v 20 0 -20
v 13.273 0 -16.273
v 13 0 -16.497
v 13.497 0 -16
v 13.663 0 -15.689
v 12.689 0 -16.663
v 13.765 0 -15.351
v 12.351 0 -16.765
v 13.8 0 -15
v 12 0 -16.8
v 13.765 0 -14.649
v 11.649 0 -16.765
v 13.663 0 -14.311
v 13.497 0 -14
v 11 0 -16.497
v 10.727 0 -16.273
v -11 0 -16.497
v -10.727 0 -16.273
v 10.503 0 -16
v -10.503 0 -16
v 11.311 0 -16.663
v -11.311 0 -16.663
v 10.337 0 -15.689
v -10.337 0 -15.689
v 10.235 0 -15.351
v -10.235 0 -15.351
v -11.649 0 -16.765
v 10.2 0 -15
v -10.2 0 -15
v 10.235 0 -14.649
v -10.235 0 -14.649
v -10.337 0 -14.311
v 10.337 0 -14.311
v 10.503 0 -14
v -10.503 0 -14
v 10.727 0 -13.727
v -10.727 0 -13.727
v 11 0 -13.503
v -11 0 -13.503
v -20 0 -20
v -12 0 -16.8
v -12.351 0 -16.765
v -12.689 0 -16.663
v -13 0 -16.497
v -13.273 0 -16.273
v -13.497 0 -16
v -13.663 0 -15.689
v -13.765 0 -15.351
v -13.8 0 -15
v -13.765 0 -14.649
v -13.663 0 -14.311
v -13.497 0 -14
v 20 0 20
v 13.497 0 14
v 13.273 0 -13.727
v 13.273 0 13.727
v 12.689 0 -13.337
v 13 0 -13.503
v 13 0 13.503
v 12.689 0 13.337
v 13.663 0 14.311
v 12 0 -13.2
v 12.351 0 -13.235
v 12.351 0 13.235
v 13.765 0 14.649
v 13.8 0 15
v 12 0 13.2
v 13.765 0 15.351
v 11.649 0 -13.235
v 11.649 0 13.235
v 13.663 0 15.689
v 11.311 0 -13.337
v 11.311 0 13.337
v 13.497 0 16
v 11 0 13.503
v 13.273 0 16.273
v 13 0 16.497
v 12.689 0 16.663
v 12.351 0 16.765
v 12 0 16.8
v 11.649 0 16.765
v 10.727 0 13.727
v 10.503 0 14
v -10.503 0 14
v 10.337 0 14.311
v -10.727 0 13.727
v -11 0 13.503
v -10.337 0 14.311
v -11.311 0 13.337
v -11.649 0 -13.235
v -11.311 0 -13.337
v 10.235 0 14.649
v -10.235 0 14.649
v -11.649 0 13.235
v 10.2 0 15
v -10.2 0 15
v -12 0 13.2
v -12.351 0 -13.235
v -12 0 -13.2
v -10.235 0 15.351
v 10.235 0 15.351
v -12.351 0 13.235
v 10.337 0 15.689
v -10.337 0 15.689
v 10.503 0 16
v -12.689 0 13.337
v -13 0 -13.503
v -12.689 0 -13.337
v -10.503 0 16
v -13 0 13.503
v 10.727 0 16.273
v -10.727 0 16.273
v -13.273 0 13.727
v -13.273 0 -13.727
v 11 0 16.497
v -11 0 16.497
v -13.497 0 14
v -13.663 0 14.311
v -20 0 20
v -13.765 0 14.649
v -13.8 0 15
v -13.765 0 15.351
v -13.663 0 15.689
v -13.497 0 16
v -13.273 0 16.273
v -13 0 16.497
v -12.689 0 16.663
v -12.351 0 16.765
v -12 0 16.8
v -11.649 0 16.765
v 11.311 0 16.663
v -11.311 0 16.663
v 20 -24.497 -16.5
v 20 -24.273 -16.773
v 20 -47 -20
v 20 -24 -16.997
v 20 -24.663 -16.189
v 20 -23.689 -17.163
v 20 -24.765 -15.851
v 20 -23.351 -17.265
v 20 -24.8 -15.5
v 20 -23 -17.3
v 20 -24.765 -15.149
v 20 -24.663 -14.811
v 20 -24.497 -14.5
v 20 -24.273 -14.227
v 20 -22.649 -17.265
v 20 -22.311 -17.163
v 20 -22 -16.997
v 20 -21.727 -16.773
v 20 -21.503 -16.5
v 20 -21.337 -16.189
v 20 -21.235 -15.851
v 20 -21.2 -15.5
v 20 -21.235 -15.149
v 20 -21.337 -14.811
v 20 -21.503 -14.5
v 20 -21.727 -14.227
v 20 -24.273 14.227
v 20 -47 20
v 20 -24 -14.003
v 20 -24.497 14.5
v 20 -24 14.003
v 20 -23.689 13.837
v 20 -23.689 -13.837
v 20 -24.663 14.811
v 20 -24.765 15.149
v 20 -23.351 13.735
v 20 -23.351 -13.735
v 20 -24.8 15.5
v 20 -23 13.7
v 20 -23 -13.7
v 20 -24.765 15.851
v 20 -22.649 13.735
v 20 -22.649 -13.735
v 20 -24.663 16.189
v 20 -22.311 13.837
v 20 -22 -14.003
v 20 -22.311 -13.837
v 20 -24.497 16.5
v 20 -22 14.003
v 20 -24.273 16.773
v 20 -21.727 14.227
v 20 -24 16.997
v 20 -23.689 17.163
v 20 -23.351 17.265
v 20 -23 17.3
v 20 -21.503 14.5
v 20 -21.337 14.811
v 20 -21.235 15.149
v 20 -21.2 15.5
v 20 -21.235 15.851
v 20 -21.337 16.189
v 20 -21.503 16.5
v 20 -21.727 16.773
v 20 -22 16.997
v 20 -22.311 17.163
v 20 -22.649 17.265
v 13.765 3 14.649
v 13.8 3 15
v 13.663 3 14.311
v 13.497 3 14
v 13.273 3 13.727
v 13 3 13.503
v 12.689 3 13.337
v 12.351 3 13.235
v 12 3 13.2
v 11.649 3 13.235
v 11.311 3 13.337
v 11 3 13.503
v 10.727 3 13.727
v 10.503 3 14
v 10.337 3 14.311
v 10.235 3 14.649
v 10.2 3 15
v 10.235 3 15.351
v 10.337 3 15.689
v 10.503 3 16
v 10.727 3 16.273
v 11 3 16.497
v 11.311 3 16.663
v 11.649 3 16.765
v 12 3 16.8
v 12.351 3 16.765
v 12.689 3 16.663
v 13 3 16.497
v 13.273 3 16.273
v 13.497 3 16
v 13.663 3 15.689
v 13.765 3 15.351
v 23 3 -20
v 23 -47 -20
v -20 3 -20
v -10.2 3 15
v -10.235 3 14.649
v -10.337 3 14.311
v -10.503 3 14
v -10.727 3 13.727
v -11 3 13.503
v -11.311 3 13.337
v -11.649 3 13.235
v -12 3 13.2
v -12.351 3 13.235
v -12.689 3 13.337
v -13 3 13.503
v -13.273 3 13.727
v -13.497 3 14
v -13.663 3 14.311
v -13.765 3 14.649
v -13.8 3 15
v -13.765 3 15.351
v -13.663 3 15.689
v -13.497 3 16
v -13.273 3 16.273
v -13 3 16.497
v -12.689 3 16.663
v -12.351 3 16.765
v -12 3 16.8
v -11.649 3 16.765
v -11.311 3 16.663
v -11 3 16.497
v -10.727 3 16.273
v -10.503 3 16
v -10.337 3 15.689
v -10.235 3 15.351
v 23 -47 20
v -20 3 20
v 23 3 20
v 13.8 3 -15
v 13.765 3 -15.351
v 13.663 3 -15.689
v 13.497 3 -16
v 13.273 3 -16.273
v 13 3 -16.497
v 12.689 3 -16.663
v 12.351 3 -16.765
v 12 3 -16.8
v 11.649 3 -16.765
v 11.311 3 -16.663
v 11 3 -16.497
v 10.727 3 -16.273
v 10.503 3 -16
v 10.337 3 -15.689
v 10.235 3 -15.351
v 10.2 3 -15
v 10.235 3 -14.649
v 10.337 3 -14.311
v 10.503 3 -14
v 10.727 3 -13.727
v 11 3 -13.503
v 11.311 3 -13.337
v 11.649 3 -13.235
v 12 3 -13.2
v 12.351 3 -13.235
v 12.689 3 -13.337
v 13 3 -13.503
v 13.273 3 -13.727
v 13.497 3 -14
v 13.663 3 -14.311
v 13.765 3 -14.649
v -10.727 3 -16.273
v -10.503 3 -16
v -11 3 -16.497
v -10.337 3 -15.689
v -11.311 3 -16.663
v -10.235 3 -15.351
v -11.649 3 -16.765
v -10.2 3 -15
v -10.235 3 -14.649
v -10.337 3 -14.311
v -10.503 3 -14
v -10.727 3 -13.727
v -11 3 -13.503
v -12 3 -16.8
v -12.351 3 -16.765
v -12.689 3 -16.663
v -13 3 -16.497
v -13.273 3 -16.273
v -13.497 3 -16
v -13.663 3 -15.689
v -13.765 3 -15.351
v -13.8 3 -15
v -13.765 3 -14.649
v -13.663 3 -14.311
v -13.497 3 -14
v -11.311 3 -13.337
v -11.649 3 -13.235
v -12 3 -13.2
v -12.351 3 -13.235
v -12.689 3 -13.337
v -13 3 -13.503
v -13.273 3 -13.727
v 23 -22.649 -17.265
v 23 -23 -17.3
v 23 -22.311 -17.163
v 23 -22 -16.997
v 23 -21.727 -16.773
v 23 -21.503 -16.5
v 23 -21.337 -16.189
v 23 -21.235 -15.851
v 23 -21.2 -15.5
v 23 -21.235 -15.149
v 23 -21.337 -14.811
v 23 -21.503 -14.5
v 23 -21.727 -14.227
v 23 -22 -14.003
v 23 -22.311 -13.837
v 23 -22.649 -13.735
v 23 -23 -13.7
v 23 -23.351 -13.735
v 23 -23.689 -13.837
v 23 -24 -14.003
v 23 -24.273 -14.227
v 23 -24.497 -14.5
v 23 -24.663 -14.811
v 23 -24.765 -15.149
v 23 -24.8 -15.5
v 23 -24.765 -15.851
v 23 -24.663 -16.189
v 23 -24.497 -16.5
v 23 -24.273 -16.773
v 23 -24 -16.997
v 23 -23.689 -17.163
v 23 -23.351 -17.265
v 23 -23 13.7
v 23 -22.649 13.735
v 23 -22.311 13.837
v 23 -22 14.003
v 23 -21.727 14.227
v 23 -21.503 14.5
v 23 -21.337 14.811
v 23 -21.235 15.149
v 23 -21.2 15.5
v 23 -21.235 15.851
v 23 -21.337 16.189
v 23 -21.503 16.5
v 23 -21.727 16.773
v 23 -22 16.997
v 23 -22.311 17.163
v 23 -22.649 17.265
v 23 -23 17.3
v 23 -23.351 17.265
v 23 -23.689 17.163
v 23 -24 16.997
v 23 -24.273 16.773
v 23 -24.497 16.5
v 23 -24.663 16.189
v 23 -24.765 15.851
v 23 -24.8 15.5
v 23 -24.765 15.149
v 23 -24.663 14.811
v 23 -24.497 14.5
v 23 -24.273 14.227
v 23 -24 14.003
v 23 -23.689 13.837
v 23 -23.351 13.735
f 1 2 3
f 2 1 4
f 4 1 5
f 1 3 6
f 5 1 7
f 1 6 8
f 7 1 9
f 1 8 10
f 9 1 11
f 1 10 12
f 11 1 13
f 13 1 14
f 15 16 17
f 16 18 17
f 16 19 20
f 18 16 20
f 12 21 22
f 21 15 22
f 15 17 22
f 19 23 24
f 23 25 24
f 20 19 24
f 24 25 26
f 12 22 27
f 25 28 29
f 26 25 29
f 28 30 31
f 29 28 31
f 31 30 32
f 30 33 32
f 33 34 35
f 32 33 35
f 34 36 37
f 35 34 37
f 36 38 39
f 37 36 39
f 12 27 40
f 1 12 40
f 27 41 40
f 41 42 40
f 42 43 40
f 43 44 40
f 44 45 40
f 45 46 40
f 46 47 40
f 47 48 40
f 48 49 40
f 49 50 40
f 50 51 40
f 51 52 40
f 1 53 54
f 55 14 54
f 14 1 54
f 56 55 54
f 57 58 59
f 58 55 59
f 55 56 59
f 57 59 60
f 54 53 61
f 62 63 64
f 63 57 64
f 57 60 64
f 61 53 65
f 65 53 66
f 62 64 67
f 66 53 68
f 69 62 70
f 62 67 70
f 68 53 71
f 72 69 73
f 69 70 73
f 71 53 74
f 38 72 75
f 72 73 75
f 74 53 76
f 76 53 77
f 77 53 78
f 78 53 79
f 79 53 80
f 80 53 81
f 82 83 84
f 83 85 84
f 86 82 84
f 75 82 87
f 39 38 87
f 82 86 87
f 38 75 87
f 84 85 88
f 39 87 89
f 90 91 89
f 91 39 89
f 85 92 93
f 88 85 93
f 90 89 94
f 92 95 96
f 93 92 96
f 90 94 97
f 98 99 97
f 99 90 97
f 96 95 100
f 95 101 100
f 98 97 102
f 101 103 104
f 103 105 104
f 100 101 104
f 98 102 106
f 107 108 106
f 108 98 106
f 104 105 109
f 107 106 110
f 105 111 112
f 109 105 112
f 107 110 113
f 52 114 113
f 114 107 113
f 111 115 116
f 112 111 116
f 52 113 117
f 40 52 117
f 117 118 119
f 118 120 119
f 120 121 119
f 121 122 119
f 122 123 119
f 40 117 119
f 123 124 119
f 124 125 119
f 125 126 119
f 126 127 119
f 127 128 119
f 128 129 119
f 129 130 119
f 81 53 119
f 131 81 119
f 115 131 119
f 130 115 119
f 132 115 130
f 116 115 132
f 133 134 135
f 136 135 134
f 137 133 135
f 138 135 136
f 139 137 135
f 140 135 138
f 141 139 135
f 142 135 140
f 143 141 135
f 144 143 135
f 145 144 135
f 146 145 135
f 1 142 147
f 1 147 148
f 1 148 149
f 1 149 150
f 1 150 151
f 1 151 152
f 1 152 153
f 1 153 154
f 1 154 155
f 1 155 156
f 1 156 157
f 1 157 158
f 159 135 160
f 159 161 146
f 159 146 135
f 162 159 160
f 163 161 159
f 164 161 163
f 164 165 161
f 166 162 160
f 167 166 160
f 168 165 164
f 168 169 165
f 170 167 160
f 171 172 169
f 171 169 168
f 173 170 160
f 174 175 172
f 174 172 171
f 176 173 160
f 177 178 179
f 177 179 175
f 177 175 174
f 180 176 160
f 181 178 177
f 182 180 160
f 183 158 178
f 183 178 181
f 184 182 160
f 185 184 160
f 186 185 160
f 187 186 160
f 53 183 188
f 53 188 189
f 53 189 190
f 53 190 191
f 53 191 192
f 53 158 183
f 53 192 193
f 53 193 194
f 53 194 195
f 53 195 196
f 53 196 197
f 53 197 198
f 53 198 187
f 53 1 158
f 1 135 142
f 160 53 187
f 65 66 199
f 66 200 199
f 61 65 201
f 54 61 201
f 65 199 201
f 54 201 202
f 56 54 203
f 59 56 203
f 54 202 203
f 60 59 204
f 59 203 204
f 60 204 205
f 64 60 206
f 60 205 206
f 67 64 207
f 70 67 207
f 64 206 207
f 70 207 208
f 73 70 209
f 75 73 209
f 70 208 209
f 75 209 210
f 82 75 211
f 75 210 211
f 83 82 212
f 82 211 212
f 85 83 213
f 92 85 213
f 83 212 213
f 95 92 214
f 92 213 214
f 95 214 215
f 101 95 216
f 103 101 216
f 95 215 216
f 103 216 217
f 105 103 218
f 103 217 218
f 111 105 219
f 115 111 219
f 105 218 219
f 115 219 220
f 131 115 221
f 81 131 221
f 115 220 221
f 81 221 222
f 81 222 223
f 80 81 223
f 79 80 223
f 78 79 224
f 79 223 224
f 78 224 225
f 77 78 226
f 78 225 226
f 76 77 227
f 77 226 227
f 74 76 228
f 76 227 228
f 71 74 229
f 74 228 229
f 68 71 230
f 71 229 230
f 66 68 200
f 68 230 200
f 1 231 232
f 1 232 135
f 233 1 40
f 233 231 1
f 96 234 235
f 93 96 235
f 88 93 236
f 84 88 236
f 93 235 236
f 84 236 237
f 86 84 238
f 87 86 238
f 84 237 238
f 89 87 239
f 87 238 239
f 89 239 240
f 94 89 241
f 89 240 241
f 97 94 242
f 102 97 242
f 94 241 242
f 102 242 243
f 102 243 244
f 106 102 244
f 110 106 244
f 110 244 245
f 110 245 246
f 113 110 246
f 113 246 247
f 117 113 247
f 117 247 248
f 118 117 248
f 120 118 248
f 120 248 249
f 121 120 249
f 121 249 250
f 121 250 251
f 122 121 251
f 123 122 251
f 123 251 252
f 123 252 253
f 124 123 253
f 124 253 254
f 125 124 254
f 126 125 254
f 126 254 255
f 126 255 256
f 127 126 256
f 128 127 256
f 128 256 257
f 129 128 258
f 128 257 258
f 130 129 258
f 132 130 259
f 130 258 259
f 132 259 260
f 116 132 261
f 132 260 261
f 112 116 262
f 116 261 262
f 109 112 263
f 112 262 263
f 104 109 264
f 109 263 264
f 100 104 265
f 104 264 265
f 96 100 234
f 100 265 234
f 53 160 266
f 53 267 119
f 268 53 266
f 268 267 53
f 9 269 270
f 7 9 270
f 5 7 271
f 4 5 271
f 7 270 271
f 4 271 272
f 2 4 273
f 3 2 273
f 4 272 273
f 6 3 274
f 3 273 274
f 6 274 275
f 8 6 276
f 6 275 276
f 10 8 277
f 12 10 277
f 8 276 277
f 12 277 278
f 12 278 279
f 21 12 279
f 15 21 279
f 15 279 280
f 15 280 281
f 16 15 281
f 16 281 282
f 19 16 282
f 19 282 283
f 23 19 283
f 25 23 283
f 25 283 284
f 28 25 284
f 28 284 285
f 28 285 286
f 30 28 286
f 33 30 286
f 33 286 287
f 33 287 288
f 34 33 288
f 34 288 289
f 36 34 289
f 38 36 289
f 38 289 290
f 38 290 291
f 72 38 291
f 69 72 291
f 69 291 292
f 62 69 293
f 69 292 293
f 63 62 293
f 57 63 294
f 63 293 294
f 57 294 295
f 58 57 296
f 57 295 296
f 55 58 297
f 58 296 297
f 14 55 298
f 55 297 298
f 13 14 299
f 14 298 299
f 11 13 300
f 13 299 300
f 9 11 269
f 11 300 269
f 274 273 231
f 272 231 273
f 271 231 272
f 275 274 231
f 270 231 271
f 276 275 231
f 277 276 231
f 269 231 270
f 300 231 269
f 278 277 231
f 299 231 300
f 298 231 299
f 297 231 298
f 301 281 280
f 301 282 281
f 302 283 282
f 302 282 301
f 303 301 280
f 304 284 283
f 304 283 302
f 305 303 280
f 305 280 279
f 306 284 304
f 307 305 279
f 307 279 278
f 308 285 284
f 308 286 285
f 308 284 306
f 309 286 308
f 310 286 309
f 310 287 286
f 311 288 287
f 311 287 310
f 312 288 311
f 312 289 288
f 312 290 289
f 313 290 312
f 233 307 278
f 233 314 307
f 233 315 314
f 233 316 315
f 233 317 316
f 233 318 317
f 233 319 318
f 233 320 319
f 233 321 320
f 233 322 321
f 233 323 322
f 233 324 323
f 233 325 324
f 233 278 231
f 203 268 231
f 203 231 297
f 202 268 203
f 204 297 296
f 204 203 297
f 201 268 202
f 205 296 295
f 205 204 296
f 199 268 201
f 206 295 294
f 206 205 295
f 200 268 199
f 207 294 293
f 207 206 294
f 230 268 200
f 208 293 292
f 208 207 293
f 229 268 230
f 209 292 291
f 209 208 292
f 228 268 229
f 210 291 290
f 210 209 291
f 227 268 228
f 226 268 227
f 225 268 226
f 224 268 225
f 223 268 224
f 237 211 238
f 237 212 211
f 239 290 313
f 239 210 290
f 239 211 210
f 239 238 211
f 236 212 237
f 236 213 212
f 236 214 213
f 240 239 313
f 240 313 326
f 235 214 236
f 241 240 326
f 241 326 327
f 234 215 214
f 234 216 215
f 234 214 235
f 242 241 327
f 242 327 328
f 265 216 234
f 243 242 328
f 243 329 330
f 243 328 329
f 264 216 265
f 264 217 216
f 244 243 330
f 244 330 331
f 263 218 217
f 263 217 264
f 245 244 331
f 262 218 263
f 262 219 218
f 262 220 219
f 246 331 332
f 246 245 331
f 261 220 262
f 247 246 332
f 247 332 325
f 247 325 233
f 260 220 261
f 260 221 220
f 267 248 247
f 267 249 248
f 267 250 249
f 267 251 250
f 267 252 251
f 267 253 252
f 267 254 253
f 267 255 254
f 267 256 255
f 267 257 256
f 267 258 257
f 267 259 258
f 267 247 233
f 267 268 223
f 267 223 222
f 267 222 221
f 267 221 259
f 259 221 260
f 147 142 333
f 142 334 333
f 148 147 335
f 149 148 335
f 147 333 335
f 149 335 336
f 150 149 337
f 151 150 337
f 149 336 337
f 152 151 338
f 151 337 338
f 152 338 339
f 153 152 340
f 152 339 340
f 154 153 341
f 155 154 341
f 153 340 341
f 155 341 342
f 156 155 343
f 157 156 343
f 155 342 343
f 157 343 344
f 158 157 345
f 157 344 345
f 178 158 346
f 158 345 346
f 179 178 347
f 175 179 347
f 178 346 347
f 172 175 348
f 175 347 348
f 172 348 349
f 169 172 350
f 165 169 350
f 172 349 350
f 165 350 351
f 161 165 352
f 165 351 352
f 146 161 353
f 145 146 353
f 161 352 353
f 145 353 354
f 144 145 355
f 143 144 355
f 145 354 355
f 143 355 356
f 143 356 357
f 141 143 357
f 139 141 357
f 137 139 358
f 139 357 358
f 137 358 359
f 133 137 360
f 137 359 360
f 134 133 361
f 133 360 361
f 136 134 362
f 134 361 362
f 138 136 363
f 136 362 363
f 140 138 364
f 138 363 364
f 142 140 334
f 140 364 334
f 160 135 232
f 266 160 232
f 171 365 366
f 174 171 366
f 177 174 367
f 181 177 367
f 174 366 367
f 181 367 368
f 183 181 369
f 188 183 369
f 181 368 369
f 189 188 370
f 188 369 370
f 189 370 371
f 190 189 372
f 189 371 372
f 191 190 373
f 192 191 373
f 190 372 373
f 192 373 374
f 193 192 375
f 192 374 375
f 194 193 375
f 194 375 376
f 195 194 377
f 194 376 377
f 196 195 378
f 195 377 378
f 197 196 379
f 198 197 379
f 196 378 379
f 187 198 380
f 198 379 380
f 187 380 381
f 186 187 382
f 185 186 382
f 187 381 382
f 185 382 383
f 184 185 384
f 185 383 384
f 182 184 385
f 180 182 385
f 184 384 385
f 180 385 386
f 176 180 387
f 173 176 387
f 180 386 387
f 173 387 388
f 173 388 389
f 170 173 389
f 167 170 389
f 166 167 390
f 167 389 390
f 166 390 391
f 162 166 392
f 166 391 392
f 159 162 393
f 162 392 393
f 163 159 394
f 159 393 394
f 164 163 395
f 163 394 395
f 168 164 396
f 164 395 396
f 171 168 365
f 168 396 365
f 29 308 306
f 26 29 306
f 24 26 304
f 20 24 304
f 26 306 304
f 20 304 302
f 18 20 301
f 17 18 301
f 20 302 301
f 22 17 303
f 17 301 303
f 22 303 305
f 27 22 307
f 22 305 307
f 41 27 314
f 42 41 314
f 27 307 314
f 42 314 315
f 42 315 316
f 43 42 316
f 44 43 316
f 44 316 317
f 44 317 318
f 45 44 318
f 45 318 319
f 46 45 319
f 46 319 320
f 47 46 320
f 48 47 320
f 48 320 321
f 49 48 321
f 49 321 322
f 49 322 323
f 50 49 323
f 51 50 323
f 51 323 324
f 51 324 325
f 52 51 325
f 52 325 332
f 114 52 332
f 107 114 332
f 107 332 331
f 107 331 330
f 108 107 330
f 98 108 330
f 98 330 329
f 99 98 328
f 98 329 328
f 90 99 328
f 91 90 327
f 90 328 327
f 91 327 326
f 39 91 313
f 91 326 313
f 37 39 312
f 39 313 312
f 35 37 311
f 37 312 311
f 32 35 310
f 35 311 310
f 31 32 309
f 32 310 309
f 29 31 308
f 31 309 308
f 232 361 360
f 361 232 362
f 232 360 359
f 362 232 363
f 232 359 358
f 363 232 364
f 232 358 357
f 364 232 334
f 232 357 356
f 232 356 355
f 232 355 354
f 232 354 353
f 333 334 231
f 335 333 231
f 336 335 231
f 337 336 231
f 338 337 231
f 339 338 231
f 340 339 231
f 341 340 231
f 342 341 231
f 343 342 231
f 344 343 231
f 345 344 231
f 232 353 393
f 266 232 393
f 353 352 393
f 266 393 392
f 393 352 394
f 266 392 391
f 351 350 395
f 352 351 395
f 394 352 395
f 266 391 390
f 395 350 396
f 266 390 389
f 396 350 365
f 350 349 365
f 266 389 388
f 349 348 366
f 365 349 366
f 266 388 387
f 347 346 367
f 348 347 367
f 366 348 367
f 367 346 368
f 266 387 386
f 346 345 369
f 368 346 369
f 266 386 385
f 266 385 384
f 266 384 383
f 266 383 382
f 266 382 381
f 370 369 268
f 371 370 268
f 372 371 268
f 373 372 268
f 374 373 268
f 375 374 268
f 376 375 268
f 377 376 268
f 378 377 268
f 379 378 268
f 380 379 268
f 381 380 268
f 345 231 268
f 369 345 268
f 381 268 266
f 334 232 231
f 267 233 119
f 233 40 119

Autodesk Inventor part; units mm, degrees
ref_plane "YZ Plane" through (0, 0, 0) normal (1, 0, 0) x (0, 1, 0)
ref_plane "XZ Plane" through (0, 0, 0) normal (0, 1, 0) x (-1, 0, 0)
ref_plane "XY Plane" through (0, 0, 0) normal (0, 0, 1) x (1, 0, 0)
sketch "草图1" plane through (0, 0, 0) normal (0, 1, 0) x (-1, 0, 0)
  line L0 (20, 20) -> (-20, 20)
  line L1 (-20, 20) -> (-20, -20)
  line L2 (-20, -20) -> (20, -20)
  line L3 (20, -20) -> (20, 20)
  point P0 (0, 0)
  dimension "d0" = 40
  dimension "d1" = 40
extrude "拉伸1" add sketch "草图1" along normal blind 3
sketch "草图6" plane through (20, 0, 20) normal (1, 0, 0) x (0, 0, -1)
  point P0 (20, 0)
sketch "草图7" plane through (20, 0, 20) normal (1, 0, 0) x (0, 0, -1)
  line L0 (40, 3) -> (0, 3) projected
  line L1 (0, 0) -> (40, 0)
  line L2 (40, 0) -> (40, 3)
  line L3 (40, 3) -> (0, 3)
  line L4 (0, 3) -> (0, 0)
  point P0 (20, 0)
extrude "拉伸6" add sketch "草图7" along normal blind 3
sketch "草图8" plane through (0, 0, 0) normal (0, -1, 0) x (1, 0, 0)
  line L0 (23, -20) -> (23, 20) projected
  line L1 (20, 20) -> (23, 20)
  line L2 (23, 20) -> (23, -20)
  line L3 (23, -20) -> (20, -20)
  line L4 (20, -20) -> (20, 20)
  point P0 (0, 0)
extrude "拉伸7" add sketch "草图8" along normal blind 47
sketch "草图9" plane through (23, 0, 20) normal (1, 0, 0) x (0, 0, -1)
  point P0 (20, 0)
sketch "草图10" plane through (23, 0, 20) normal (1, 0, 0) x (0, 0, -1)
  circle A0 centre (35.5, -23) radius 1.8
  point P0 (20, 0)
  dimension "d20" = 3.6
extrude "拉伸8" cut sketch "草图10" against normal through all
sketch "草图11" plane through (23, 0, 20) normal (1, 0, 0) x (0, 0, -1)
  circle A0 centre (4.5, -23) radius 1.8
  point P0 (20, 0)
  dimension "d23" = 3.6
extrude "拉伸9" cut sketch "草图11" against normal through all
sketch "草图12" plane through (0, 3, 0) normal (0, 1, 0) x (1, 0, 0)
  circle A0 centre (12, 15) radius 1.8
  point P0 (0, 0)
  dimension "d26" = 3.6
extrude "拉伸10" cut sketch "草图12" against normal through all
sketch "草图13" plane through (0, 3, 0) normal (0, 1, 0) x (1, 0, 0)
  circle A0 centre (-12, 15) radius 1.8
  point P0 (0, 0)
  dimension "d29" = 3.6
extrude "拉伸11" cut sketch "草图13" against normal through all
sketch "草图14" plane through (0, 3, 0) normal (0, 1, 0) x (1, 0, 0)
  circle A0 centre (-12, -15) radius 1.8
  point P0 (0, 0)
  dimension "d32" = 3.6
extrude "拉伸12" cut sketch "草图14" against normal through all
sketch "草图15" plane through (0, 3, 0) normal (0, 1, 0) x (1, 0, 0)
  circle A0 centre (12, -15) radius 1.8
  point P0 (0, 0)
  dimension "d35" = 3.6
extrude "拉伸13" cut sketch "草图15" against normal through all
equation "\"折弯半径\" = 厚度"
equation "\"折弯释压宽度\" = 厚度"
equation "\"折弯释压深度\" = 0.5 * 厚度"
equation "\"拐角释压尺寸\" = 4 * 厚度"
equation "\"最小余量\" = 2 * 厚度"
equation "\"过渡半径\" = 折弯半径"
equation "\"Jacobi半径尺寸\" = 折弯半径"
equation "\"间隙大小\" = 厚度"
equation "\"厚度\" = 0.5"
properties part number "连接架"
